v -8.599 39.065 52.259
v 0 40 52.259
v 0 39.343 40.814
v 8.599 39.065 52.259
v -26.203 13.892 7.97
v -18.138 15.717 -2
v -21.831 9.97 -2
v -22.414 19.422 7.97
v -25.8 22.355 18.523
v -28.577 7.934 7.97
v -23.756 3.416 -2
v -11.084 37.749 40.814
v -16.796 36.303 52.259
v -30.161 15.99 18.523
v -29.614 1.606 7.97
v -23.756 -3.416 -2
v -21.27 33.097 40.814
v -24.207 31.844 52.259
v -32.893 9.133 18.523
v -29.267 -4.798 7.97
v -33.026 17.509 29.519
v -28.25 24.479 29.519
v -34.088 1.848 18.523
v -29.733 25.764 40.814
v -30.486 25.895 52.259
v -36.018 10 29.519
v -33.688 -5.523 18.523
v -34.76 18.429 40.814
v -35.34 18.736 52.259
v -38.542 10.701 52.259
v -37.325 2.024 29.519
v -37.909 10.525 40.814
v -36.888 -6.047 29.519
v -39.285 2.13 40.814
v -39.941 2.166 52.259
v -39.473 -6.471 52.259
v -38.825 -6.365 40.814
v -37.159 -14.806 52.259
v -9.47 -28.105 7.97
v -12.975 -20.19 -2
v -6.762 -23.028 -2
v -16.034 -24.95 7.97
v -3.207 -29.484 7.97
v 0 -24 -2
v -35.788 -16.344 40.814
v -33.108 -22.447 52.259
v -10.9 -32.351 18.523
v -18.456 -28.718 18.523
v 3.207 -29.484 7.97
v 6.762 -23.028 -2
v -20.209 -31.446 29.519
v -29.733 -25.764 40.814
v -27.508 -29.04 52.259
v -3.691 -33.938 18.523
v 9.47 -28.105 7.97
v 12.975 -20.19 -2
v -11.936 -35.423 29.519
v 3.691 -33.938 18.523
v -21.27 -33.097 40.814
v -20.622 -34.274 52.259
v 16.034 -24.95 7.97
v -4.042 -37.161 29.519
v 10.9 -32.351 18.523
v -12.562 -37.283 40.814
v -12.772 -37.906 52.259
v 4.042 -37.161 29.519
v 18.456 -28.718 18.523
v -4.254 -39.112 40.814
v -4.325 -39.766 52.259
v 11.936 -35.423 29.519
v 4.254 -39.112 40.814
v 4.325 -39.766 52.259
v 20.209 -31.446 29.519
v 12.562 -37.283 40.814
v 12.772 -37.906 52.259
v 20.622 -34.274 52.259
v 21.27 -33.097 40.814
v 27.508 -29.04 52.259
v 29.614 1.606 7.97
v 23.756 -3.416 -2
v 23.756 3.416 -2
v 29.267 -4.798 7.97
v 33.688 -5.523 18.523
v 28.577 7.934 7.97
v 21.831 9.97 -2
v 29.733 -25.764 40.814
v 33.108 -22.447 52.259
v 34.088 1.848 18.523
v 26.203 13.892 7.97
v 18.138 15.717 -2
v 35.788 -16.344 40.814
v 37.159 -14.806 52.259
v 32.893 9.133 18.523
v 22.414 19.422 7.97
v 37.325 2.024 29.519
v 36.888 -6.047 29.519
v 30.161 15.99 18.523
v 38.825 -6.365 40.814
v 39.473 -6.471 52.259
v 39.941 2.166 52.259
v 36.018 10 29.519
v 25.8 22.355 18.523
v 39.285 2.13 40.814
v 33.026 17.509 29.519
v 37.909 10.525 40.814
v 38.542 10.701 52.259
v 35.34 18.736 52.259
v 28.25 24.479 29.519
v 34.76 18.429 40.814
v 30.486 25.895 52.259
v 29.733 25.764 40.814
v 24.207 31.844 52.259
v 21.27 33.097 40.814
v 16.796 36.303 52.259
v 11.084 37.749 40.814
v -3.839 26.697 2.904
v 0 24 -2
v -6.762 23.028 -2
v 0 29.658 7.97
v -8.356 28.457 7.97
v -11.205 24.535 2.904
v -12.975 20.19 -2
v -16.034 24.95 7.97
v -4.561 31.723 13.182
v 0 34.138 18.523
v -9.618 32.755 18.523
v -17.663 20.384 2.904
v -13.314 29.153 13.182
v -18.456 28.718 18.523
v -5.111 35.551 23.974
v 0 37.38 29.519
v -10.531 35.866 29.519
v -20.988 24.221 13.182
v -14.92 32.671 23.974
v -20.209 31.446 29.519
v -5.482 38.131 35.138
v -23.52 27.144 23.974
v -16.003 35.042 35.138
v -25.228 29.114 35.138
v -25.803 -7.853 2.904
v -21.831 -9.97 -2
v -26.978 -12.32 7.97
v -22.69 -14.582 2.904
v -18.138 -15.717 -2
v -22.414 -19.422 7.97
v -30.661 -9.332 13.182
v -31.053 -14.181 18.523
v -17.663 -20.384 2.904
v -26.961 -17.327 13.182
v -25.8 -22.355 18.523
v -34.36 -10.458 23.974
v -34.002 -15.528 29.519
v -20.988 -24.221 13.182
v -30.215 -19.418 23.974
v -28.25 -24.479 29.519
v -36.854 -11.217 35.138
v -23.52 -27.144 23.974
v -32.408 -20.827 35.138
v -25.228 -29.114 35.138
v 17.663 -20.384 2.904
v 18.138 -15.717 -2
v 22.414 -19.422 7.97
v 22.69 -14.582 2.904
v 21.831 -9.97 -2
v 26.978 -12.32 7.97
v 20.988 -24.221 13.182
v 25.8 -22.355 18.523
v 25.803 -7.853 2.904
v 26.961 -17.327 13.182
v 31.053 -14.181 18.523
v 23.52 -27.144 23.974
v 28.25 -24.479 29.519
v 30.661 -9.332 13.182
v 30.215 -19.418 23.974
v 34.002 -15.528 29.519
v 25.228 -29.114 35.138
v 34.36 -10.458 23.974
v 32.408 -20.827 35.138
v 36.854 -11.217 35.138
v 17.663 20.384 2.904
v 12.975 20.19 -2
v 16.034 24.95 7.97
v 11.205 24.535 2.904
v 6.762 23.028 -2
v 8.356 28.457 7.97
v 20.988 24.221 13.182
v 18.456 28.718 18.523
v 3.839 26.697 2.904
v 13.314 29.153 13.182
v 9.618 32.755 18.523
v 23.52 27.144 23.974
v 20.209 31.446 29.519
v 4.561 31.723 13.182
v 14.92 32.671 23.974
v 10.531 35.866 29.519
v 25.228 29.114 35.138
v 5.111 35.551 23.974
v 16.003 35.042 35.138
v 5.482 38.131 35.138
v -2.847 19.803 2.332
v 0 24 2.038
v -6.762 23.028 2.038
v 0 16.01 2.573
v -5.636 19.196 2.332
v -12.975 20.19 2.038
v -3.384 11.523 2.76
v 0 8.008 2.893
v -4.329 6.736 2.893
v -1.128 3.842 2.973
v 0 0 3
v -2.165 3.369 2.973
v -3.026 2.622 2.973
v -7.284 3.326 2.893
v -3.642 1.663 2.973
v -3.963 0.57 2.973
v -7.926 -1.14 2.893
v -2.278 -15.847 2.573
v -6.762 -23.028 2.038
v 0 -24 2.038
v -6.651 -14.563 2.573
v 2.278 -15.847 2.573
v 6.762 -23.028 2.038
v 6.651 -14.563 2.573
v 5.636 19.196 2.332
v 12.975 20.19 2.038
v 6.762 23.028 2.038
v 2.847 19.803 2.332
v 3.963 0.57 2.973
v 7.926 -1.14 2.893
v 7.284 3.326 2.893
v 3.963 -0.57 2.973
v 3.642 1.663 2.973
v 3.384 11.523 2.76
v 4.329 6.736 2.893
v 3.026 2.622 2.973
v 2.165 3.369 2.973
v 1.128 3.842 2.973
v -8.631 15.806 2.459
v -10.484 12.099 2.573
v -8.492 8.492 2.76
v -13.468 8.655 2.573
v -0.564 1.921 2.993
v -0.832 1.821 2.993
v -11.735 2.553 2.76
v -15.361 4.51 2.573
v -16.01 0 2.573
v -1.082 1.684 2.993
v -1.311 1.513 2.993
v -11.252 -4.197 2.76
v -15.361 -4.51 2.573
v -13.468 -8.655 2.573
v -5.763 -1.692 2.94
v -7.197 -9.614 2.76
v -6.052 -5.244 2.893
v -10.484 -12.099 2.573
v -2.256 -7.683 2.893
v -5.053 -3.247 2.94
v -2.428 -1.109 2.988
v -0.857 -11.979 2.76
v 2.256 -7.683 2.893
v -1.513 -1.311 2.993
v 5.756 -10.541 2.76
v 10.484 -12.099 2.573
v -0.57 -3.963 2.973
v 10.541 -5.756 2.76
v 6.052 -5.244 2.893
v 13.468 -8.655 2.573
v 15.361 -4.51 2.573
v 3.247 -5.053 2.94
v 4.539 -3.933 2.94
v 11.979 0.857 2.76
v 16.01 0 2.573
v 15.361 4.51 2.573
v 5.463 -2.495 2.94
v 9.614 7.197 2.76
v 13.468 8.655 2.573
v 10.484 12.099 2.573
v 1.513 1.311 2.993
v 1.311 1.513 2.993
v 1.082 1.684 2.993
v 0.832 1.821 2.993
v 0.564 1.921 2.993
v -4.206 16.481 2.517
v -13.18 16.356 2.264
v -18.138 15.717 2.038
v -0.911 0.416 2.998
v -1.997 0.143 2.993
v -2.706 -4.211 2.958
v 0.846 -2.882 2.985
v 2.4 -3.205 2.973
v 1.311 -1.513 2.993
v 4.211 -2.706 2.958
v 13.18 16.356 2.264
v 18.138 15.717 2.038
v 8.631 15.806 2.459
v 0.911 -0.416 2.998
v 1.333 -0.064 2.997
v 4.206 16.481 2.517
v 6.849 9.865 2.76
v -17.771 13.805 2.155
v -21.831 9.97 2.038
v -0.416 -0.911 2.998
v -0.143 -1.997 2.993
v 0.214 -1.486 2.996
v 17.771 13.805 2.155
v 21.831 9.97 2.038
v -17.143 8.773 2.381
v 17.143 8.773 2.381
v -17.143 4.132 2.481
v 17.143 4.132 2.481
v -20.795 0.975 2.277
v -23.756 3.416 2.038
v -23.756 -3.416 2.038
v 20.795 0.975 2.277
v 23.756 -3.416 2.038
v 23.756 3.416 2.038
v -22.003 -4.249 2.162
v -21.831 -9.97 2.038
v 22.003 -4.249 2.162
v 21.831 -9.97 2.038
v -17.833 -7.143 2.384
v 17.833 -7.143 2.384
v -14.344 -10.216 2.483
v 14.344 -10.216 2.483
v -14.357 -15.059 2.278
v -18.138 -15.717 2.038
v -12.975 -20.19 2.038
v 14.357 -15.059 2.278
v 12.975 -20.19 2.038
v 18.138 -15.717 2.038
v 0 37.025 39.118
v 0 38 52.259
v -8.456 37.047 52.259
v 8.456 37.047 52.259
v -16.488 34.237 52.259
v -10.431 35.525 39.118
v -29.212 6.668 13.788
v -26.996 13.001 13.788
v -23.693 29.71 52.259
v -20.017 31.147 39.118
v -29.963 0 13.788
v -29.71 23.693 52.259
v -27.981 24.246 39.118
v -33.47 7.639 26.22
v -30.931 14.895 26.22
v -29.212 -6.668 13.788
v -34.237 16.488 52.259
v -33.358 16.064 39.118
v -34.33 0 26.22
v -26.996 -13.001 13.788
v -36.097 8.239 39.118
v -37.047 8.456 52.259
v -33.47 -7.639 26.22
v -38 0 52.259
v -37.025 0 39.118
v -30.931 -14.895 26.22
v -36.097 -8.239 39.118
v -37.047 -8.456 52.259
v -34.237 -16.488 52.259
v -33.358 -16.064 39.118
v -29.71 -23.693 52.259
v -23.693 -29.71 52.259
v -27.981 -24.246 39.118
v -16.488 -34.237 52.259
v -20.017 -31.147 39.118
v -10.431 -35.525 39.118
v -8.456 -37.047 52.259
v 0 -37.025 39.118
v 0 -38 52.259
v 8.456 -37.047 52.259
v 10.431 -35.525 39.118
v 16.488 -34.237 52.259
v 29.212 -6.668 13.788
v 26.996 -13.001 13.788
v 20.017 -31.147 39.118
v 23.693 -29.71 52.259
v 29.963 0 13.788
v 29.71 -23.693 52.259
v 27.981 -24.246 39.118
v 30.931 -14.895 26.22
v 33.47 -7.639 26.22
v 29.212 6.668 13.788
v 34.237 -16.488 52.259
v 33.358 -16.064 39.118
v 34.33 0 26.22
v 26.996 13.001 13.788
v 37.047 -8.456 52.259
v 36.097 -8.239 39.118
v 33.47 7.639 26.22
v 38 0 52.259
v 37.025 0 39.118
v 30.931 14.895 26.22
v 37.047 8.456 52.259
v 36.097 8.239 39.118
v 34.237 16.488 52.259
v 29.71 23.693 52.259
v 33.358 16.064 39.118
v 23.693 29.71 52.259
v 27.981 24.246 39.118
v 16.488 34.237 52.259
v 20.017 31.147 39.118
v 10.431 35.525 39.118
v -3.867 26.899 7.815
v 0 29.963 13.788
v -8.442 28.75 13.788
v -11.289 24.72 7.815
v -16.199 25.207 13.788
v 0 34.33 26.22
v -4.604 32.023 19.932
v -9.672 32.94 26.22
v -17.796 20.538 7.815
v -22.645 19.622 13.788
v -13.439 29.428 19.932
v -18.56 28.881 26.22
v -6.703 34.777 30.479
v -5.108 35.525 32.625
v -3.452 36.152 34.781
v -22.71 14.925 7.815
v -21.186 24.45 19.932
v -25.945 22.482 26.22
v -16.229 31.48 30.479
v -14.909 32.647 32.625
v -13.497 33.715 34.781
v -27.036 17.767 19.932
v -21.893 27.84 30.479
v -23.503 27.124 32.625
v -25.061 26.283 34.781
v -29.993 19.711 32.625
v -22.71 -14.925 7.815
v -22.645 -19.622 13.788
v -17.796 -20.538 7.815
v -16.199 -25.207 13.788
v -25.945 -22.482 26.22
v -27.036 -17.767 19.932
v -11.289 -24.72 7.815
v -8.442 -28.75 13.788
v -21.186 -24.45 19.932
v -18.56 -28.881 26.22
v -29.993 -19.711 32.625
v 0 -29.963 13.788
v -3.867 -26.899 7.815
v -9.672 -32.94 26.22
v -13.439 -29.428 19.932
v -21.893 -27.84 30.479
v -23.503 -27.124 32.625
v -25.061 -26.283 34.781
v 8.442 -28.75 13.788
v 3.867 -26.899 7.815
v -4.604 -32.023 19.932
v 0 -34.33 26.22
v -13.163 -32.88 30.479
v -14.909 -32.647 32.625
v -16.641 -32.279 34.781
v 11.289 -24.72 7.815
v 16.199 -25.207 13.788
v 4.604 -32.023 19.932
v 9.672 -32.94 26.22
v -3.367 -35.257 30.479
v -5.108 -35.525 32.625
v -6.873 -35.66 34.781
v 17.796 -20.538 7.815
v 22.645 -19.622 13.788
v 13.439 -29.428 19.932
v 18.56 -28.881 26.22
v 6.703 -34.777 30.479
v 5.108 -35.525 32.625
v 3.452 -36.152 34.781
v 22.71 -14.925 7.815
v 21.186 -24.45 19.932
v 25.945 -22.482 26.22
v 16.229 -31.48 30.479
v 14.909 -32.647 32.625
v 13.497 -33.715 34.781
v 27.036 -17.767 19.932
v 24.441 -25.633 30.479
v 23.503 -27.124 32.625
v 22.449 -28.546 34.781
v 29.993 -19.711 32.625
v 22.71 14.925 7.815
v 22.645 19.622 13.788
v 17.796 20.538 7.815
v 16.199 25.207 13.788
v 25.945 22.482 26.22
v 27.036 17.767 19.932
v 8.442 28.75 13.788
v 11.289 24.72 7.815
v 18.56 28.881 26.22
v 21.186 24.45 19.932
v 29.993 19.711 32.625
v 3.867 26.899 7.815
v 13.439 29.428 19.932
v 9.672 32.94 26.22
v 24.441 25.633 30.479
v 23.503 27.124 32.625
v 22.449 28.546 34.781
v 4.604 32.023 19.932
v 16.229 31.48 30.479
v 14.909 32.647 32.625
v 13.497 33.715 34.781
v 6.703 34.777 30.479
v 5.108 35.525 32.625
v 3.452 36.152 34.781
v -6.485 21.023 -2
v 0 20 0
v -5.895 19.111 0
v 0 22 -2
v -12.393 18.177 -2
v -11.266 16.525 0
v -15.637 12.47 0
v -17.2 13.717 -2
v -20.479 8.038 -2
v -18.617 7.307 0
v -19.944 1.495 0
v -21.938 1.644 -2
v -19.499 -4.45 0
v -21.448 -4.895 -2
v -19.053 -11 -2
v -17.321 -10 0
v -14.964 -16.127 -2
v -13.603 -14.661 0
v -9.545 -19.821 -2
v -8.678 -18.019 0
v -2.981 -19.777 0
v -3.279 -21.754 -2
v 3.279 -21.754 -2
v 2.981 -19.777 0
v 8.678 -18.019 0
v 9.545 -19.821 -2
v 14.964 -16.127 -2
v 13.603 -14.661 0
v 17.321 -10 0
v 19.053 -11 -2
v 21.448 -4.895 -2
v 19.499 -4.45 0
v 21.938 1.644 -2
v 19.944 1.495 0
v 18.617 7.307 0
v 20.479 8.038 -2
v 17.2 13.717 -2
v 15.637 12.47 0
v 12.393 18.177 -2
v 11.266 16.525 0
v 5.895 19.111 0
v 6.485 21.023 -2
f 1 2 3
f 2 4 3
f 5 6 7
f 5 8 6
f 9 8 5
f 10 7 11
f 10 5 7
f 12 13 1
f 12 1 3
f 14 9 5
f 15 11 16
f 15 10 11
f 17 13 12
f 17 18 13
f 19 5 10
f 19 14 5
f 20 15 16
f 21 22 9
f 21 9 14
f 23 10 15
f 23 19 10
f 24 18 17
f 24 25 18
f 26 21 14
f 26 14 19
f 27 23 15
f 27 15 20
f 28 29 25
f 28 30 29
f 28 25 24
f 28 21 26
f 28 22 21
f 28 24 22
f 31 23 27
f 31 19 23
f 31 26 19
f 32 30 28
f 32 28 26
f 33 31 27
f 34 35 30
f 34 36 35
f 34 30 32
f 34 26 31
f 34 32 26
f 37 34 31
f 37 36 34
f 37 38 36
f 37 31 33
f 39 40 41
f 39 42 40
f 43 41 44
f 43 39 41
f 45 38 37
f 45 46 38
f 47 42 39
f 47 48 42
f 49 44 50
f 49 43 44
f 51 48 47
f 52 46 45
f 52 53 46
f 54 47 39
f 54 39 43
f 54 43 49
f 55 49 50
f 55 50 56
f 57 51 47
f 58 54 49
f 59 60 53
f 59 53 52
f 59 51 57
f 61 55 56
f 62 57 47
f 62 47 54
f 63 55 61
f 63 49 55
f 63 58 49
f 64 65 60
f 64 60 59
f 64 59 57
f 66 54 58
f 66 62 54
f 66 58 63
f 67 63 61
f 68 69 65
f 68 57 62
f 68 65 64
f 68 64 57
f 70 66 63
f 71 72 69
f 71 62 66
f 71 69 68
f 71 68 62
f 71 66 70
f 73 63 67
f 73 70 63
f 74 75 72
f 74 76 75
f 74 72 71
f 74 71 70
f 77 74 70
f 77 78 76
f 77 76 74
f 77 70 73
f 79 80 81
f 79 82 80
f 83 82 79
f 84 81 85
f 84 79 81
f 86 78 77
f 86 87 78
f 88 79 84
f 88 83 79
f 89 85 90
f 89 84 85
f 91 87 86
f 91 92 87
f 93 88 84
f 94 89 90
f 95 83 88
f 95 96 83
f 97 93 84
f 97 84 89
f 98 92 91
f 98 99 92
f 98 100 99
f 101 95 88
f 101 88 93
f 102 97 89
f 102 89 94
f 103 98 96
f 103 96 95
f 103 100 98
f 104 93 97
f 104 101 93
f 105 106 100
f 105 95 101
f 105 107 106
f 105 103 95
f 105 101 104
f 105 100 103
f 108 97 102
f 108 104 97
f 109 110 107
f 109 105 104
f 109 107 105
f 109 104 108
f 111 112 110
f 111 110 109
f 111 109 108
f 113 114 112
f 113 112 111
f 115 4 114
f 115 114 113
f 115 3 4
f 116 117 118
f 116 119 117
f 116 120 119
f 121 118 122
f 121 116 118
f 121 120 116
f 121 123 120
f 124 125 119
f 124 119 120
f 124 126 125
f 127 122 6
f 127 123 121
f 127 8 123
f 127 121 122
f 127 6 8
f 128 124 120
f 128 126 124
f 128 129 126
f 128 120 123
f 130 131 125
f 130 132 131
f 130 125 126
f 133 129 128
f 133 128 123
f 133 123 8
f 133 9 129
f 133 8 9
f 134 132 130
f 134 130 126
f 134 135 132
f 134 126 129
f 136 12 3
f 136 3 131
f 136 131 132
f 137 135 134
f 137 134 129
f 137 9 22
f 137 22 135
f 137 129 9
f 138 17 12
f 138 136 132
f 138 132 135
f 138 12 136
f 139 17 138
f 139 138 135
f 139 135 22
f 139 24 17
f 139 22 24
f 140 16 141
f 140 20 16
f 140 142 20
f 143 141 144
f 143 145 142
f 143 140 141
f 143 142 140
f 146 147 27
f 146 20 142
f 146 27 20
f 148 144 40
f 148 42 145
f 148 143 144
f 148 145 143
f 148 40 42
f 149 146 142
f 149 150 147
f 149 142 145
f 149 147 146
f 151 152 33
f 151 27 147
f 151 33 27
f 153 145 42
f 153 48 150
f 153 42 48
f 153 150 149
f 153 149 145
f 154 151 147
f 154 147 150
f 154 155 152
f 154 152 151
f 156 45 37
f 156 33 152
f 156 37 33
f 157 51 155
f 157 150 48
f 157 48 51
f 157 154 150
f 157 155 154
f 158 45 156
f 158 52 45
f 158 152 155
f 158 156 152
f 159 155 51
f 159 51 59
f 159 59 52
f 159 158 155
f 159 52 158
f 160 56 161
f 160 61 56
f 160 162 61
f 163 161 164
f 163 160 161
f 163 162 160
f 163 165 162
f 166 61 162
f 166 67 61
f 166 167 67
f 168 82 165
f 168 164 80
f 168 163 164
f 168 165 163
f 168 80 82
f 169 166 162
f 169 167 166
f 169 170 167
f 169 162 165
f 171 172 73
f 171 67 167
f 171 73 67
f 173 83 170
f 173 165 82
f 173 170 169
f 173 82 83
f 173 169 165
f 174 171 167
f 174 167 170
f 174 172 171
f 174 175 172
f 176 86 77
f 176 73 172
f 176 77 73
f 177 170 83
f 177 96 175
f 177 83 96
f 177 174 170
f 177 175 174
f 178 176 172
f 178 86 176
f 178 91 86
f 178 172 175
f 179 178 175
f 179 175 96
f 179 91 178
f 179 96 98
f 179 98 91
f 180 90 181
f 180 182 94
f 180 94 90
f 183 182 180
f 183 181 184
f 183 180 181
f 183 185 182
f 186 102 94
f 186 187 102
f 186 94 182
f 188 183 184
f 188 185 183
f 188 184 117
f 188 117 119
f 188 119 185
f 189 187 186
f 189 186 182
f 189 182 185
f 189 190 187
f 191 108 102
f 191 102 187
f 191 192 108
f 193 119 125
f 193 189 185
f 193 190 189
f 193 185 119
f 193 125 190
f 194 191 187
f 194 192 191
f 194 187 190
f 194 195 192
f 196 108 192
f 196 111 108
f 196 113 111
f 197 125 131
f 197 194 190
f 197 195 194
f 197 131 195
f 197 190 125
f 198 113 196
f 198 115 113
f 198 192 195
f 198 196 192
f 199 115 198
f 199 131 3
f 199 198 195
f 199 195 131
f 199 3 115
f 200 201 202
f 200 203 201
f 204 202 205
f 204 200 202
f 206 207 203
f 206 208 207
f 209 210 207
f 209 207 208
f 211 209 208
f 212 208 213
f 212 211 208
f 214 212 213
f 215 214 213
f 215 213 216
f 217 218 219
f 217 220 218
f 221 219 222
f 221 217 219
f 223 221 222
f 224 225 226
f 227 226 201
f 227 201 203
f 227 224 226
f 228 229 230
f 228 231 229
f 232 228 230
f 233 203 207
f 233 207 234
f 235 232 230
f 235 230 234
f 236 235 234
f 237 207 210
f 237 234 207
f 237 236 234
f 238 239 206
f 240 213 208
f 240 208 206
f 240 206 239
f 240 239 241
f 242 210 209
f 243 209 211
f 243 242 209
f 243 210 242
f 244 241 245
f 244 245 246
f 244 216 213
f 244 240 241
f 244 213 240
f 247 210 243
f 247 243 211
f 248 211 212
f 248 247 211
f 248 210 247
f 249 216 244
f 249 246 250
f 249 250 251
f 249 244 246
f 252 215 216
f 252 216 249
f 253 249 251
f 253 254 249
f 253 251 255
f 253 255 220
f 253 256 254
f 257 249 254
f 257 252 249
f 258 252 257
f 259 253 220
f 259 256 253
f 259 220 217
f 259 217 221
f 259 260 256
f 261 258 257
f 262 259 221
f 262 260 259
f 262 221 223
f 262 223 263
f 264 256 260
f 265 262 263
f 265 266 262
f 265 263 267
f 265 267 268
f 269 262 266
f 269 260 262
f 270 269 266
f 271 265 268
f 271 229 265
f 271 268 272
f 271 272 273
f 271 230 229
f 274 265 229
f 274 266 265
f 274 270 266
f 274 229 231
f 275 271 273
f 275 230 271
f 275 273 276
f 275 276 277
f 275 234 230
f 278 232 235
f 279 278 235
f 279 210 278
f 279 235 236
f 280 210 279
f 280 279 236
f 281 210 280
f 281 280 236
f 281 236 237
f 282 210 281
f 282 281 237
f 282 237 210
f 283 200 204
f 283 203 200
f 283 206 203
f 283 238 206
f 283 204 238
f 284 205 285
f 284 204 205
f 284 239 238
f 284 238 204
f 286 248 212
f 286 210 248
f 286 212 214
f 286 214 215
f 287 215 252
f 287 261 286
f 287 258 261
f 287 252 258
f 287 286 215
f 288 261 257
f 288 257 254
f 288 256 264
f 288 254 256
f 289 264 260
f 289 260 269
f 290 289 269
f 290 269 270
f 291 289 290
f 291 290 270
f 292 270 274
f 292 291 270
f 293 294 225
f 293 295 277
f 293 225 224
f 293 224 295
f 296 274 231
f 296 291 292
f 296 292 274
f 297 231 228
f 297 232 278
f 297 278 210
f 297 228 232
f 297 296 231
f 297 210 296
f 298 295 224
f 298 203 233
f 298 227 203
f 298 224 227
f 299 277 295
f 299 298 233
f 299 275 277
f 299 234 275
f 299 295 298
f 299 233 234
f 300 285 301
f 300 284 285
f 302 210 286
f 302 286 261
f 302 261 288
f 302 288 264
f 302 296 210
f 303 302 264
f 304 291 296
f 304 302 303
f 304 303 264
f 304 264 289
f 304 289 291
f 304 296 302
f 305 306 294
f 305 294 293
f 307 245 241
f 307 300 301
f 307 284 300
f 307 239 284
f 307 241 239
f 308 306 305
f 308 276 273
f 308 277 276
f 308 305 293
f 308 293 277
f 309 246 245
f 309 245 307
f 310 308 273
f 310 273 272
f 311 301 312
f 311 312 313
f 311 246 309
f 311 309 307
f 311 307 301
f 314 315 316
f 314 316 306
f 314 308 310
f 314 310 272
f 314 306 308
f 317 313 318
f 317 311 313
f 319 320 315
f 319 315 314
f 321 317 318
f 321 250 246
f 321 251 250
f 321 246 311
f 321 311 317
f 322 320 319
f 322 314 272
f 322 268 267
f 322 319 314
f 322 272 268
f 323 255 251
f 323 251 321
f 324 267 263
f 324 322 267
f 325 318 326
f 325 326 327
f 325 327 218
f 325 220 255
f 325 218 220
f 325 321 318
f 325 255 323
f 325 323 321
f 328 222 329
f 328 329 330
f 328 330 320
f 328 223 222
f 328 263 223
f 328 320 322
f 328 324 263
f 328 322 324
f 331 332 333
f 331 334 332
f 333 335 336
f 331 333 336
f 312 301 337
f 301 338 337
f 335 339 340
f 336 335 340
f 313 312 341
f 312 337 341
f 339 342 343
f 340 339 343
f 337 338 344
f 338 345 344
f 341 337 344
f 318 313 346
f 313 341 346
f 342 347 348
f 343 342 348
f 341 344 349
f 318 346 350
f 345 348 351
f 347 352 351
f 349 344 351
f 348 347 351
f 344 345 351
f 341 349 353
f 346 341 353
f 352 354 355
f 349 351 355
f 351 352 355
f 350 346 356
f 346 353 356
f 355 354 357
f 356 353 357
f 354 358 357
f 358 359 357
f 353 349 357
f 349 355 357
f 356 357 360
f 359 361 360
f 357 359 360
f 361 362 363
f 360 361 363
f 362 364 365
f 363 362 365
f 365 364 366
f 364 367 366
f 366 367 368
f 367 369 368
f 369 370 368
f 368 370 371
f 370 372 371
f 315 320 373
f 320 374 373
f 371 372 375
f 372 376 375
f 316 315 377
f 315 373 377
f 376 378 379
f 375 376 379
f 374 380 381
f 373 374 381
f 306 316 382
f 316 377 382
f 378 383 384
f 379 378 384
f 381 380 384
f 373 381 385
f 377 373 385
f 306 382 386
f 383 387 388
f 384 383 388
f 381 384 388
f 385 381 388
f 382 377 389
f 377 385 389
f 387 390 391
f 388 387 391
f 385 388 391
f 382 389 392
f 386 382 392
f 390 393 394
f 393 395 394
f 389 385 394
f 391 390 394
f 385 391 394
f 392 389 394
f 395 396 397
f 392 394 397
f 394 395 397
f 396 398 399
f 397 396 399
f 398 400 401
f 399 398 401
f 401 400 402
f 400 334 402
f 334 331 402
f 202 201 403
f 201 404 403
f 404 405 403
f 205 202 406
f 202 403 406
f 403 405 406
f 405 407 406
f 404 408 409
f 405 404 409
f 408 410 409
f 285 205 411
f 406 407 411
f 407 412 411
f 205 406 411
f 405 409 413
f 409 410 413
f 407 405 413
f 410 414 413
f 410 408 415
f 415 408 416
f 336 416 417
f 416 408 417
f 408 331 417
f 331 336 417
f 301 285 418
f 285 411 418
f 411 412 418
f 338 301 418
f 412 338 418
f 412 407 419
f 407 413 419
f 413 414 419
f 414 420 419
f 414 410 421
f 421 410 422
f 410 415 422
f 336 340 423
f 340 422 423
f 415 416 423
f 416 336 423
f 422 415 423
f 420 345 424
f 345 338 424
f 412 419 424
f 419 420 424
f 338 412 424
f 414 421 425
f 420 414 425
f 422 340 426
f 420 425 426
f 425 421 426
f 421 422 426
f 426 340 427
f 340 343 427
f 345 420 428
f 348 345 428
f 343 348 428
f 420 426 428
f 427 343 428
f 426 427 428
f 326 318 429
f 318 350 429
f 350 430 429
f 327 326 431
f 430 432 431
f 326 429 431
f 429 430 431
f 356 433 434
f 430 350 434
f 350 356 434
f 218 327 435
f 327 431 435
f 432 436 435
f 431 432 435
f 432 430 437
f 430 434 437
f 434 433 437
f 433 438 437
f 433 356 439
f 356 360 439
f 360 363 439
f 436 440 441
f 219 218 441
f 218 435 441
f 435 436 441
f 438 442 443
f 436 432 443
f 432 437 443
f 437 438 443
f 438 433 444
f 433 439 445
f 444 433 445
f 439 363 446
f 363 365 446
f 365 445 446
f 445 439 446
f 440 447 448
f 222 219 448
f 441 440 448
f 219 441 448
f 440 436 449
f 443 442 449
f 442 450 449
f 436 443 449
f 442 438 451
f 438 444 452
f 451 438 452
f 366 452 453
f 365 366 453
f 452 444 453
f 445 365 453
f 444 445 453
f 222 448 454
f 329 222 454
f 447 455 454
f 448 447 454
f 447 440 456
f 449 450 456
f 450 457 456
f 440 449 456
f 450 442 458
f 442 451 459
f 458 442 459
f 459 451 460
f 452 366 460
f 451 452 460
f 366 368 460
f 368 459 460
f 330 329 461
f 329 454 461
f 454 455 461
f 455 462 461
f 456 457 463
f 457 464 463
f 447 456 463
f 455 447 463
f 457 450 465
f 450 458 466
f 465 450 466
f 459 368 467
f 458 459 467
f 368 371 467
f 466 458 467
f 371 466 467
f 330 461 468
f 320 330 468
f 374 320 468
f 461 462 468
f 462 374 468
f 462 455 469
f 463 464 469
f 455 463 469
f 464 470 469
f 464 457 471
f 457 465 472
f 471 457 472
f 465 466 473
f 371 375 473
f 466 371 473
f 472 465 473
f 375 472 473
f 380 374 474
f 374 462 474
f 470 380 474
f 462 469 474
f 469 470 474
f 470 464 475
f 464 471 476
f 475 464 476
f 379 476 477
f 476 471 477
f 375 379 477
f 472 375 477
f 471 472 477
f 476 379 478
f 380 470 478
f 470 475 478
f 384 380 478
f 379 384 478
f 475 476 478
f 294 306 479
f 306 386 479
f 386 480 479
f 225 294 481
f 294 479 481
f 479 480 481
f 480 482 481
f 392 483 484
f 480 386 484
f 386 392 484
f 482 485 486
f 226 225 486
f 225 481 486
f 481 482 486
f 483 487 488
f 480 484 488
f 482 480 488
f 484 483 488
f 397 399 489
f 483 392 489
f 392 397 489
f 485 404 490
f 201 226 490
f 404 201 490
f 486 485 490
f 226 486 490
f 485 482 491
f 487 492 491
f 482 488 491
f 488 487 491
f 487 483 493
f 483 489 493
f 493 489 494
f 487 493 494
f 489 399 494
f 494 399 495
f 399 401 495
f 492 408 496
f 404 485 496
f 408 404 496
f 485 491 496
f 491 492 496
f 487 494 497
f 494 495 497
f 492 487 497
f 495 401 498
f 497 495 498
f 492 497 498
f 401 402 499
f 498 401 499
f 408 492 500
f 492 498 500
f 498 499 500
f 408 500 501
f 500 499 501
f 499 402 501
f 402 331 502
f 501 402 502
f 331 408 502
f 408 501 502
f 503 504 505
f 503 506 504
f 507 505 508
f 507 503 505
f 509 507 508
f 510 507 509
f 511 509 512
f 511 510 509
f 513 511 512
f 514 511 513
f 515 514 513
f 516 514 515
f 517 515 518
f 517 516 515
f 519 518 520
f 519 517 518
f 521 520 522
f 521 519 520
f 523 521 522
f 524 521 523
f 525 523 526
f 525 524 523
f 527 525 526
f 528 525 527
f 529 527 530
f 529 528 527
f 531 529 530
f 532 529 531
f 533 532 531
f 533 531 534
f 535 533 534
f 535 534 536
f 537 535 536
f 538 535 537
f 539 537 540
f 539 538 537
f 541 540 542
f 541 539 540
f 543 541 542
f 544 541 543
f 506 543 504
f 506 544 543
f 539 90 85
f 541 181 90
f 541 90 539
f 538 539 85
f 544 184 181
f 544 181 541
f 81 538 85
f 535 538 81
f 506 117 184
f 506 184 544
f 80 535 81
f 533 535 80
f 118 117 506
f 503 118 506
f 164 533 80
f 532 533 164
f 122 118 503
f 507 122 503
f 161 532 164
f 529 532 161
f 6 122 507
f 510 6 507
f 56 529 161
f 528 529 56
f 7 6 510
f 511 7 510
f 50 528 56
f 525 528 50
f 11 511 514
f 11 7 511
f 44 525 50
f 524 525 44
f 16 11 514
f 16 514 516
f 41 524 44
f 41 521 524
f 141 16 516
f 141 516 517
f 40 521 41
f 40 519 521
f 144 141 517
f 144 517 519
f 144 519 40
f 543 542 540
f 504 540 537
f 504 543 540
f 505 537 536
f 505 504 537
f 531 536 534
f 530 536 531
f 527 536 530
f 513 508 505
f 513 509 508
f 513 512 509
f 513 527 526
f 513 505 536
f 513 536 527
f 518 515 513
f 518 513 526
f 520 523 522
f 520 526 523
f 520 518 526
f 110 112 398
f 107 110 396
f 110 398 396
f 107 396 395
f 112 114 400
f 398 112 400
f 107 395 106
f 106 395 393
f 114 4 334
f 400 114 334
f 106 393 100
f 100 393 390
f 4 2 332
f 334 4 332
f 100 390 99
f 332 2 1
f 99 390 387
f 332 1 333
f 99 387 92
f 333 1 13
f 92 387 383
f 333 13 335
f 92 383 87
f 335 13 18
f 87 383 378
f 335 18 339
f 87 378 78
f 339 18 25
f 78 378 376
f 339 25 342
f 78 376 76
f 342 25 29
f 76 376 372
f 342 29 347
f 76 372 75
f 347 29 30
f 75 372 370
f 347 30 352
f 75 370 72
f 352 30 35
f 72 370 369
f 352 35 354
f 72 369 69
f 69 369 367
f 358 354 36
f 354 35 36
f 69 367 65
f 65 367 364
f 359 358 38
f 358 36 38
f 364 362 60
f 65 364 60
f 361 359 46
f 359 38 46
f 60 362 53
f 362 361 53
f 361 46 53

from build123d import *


with BuildPart() as part:
    # Sketch → Revolution (revolve)
    with BuildSketch(Plane.YZ):
        with BuildLine():
            Line((0, 0), (20, 0))
            Line((20, 0), (22, -2))
            Line((22, -2), (24, -2))
            ThreePointArc((24, -2), (35.91663, 23.974369), (40, 52.25864))
            Line((38, 52.25864), (40, 52.25864))
            ThreePointArc((24, 2.038459), (34.330363, 26.220136), (38, 52.25864))
            ThreePointArc((24, 2.038459), (12.009627, 2.759518), (0, 3))
            Line((0, 3), (0, 0))
        make_face()
    revolve(axis=Axis((0, 0, 0), (0, 0, 1)))


solid = part.part
